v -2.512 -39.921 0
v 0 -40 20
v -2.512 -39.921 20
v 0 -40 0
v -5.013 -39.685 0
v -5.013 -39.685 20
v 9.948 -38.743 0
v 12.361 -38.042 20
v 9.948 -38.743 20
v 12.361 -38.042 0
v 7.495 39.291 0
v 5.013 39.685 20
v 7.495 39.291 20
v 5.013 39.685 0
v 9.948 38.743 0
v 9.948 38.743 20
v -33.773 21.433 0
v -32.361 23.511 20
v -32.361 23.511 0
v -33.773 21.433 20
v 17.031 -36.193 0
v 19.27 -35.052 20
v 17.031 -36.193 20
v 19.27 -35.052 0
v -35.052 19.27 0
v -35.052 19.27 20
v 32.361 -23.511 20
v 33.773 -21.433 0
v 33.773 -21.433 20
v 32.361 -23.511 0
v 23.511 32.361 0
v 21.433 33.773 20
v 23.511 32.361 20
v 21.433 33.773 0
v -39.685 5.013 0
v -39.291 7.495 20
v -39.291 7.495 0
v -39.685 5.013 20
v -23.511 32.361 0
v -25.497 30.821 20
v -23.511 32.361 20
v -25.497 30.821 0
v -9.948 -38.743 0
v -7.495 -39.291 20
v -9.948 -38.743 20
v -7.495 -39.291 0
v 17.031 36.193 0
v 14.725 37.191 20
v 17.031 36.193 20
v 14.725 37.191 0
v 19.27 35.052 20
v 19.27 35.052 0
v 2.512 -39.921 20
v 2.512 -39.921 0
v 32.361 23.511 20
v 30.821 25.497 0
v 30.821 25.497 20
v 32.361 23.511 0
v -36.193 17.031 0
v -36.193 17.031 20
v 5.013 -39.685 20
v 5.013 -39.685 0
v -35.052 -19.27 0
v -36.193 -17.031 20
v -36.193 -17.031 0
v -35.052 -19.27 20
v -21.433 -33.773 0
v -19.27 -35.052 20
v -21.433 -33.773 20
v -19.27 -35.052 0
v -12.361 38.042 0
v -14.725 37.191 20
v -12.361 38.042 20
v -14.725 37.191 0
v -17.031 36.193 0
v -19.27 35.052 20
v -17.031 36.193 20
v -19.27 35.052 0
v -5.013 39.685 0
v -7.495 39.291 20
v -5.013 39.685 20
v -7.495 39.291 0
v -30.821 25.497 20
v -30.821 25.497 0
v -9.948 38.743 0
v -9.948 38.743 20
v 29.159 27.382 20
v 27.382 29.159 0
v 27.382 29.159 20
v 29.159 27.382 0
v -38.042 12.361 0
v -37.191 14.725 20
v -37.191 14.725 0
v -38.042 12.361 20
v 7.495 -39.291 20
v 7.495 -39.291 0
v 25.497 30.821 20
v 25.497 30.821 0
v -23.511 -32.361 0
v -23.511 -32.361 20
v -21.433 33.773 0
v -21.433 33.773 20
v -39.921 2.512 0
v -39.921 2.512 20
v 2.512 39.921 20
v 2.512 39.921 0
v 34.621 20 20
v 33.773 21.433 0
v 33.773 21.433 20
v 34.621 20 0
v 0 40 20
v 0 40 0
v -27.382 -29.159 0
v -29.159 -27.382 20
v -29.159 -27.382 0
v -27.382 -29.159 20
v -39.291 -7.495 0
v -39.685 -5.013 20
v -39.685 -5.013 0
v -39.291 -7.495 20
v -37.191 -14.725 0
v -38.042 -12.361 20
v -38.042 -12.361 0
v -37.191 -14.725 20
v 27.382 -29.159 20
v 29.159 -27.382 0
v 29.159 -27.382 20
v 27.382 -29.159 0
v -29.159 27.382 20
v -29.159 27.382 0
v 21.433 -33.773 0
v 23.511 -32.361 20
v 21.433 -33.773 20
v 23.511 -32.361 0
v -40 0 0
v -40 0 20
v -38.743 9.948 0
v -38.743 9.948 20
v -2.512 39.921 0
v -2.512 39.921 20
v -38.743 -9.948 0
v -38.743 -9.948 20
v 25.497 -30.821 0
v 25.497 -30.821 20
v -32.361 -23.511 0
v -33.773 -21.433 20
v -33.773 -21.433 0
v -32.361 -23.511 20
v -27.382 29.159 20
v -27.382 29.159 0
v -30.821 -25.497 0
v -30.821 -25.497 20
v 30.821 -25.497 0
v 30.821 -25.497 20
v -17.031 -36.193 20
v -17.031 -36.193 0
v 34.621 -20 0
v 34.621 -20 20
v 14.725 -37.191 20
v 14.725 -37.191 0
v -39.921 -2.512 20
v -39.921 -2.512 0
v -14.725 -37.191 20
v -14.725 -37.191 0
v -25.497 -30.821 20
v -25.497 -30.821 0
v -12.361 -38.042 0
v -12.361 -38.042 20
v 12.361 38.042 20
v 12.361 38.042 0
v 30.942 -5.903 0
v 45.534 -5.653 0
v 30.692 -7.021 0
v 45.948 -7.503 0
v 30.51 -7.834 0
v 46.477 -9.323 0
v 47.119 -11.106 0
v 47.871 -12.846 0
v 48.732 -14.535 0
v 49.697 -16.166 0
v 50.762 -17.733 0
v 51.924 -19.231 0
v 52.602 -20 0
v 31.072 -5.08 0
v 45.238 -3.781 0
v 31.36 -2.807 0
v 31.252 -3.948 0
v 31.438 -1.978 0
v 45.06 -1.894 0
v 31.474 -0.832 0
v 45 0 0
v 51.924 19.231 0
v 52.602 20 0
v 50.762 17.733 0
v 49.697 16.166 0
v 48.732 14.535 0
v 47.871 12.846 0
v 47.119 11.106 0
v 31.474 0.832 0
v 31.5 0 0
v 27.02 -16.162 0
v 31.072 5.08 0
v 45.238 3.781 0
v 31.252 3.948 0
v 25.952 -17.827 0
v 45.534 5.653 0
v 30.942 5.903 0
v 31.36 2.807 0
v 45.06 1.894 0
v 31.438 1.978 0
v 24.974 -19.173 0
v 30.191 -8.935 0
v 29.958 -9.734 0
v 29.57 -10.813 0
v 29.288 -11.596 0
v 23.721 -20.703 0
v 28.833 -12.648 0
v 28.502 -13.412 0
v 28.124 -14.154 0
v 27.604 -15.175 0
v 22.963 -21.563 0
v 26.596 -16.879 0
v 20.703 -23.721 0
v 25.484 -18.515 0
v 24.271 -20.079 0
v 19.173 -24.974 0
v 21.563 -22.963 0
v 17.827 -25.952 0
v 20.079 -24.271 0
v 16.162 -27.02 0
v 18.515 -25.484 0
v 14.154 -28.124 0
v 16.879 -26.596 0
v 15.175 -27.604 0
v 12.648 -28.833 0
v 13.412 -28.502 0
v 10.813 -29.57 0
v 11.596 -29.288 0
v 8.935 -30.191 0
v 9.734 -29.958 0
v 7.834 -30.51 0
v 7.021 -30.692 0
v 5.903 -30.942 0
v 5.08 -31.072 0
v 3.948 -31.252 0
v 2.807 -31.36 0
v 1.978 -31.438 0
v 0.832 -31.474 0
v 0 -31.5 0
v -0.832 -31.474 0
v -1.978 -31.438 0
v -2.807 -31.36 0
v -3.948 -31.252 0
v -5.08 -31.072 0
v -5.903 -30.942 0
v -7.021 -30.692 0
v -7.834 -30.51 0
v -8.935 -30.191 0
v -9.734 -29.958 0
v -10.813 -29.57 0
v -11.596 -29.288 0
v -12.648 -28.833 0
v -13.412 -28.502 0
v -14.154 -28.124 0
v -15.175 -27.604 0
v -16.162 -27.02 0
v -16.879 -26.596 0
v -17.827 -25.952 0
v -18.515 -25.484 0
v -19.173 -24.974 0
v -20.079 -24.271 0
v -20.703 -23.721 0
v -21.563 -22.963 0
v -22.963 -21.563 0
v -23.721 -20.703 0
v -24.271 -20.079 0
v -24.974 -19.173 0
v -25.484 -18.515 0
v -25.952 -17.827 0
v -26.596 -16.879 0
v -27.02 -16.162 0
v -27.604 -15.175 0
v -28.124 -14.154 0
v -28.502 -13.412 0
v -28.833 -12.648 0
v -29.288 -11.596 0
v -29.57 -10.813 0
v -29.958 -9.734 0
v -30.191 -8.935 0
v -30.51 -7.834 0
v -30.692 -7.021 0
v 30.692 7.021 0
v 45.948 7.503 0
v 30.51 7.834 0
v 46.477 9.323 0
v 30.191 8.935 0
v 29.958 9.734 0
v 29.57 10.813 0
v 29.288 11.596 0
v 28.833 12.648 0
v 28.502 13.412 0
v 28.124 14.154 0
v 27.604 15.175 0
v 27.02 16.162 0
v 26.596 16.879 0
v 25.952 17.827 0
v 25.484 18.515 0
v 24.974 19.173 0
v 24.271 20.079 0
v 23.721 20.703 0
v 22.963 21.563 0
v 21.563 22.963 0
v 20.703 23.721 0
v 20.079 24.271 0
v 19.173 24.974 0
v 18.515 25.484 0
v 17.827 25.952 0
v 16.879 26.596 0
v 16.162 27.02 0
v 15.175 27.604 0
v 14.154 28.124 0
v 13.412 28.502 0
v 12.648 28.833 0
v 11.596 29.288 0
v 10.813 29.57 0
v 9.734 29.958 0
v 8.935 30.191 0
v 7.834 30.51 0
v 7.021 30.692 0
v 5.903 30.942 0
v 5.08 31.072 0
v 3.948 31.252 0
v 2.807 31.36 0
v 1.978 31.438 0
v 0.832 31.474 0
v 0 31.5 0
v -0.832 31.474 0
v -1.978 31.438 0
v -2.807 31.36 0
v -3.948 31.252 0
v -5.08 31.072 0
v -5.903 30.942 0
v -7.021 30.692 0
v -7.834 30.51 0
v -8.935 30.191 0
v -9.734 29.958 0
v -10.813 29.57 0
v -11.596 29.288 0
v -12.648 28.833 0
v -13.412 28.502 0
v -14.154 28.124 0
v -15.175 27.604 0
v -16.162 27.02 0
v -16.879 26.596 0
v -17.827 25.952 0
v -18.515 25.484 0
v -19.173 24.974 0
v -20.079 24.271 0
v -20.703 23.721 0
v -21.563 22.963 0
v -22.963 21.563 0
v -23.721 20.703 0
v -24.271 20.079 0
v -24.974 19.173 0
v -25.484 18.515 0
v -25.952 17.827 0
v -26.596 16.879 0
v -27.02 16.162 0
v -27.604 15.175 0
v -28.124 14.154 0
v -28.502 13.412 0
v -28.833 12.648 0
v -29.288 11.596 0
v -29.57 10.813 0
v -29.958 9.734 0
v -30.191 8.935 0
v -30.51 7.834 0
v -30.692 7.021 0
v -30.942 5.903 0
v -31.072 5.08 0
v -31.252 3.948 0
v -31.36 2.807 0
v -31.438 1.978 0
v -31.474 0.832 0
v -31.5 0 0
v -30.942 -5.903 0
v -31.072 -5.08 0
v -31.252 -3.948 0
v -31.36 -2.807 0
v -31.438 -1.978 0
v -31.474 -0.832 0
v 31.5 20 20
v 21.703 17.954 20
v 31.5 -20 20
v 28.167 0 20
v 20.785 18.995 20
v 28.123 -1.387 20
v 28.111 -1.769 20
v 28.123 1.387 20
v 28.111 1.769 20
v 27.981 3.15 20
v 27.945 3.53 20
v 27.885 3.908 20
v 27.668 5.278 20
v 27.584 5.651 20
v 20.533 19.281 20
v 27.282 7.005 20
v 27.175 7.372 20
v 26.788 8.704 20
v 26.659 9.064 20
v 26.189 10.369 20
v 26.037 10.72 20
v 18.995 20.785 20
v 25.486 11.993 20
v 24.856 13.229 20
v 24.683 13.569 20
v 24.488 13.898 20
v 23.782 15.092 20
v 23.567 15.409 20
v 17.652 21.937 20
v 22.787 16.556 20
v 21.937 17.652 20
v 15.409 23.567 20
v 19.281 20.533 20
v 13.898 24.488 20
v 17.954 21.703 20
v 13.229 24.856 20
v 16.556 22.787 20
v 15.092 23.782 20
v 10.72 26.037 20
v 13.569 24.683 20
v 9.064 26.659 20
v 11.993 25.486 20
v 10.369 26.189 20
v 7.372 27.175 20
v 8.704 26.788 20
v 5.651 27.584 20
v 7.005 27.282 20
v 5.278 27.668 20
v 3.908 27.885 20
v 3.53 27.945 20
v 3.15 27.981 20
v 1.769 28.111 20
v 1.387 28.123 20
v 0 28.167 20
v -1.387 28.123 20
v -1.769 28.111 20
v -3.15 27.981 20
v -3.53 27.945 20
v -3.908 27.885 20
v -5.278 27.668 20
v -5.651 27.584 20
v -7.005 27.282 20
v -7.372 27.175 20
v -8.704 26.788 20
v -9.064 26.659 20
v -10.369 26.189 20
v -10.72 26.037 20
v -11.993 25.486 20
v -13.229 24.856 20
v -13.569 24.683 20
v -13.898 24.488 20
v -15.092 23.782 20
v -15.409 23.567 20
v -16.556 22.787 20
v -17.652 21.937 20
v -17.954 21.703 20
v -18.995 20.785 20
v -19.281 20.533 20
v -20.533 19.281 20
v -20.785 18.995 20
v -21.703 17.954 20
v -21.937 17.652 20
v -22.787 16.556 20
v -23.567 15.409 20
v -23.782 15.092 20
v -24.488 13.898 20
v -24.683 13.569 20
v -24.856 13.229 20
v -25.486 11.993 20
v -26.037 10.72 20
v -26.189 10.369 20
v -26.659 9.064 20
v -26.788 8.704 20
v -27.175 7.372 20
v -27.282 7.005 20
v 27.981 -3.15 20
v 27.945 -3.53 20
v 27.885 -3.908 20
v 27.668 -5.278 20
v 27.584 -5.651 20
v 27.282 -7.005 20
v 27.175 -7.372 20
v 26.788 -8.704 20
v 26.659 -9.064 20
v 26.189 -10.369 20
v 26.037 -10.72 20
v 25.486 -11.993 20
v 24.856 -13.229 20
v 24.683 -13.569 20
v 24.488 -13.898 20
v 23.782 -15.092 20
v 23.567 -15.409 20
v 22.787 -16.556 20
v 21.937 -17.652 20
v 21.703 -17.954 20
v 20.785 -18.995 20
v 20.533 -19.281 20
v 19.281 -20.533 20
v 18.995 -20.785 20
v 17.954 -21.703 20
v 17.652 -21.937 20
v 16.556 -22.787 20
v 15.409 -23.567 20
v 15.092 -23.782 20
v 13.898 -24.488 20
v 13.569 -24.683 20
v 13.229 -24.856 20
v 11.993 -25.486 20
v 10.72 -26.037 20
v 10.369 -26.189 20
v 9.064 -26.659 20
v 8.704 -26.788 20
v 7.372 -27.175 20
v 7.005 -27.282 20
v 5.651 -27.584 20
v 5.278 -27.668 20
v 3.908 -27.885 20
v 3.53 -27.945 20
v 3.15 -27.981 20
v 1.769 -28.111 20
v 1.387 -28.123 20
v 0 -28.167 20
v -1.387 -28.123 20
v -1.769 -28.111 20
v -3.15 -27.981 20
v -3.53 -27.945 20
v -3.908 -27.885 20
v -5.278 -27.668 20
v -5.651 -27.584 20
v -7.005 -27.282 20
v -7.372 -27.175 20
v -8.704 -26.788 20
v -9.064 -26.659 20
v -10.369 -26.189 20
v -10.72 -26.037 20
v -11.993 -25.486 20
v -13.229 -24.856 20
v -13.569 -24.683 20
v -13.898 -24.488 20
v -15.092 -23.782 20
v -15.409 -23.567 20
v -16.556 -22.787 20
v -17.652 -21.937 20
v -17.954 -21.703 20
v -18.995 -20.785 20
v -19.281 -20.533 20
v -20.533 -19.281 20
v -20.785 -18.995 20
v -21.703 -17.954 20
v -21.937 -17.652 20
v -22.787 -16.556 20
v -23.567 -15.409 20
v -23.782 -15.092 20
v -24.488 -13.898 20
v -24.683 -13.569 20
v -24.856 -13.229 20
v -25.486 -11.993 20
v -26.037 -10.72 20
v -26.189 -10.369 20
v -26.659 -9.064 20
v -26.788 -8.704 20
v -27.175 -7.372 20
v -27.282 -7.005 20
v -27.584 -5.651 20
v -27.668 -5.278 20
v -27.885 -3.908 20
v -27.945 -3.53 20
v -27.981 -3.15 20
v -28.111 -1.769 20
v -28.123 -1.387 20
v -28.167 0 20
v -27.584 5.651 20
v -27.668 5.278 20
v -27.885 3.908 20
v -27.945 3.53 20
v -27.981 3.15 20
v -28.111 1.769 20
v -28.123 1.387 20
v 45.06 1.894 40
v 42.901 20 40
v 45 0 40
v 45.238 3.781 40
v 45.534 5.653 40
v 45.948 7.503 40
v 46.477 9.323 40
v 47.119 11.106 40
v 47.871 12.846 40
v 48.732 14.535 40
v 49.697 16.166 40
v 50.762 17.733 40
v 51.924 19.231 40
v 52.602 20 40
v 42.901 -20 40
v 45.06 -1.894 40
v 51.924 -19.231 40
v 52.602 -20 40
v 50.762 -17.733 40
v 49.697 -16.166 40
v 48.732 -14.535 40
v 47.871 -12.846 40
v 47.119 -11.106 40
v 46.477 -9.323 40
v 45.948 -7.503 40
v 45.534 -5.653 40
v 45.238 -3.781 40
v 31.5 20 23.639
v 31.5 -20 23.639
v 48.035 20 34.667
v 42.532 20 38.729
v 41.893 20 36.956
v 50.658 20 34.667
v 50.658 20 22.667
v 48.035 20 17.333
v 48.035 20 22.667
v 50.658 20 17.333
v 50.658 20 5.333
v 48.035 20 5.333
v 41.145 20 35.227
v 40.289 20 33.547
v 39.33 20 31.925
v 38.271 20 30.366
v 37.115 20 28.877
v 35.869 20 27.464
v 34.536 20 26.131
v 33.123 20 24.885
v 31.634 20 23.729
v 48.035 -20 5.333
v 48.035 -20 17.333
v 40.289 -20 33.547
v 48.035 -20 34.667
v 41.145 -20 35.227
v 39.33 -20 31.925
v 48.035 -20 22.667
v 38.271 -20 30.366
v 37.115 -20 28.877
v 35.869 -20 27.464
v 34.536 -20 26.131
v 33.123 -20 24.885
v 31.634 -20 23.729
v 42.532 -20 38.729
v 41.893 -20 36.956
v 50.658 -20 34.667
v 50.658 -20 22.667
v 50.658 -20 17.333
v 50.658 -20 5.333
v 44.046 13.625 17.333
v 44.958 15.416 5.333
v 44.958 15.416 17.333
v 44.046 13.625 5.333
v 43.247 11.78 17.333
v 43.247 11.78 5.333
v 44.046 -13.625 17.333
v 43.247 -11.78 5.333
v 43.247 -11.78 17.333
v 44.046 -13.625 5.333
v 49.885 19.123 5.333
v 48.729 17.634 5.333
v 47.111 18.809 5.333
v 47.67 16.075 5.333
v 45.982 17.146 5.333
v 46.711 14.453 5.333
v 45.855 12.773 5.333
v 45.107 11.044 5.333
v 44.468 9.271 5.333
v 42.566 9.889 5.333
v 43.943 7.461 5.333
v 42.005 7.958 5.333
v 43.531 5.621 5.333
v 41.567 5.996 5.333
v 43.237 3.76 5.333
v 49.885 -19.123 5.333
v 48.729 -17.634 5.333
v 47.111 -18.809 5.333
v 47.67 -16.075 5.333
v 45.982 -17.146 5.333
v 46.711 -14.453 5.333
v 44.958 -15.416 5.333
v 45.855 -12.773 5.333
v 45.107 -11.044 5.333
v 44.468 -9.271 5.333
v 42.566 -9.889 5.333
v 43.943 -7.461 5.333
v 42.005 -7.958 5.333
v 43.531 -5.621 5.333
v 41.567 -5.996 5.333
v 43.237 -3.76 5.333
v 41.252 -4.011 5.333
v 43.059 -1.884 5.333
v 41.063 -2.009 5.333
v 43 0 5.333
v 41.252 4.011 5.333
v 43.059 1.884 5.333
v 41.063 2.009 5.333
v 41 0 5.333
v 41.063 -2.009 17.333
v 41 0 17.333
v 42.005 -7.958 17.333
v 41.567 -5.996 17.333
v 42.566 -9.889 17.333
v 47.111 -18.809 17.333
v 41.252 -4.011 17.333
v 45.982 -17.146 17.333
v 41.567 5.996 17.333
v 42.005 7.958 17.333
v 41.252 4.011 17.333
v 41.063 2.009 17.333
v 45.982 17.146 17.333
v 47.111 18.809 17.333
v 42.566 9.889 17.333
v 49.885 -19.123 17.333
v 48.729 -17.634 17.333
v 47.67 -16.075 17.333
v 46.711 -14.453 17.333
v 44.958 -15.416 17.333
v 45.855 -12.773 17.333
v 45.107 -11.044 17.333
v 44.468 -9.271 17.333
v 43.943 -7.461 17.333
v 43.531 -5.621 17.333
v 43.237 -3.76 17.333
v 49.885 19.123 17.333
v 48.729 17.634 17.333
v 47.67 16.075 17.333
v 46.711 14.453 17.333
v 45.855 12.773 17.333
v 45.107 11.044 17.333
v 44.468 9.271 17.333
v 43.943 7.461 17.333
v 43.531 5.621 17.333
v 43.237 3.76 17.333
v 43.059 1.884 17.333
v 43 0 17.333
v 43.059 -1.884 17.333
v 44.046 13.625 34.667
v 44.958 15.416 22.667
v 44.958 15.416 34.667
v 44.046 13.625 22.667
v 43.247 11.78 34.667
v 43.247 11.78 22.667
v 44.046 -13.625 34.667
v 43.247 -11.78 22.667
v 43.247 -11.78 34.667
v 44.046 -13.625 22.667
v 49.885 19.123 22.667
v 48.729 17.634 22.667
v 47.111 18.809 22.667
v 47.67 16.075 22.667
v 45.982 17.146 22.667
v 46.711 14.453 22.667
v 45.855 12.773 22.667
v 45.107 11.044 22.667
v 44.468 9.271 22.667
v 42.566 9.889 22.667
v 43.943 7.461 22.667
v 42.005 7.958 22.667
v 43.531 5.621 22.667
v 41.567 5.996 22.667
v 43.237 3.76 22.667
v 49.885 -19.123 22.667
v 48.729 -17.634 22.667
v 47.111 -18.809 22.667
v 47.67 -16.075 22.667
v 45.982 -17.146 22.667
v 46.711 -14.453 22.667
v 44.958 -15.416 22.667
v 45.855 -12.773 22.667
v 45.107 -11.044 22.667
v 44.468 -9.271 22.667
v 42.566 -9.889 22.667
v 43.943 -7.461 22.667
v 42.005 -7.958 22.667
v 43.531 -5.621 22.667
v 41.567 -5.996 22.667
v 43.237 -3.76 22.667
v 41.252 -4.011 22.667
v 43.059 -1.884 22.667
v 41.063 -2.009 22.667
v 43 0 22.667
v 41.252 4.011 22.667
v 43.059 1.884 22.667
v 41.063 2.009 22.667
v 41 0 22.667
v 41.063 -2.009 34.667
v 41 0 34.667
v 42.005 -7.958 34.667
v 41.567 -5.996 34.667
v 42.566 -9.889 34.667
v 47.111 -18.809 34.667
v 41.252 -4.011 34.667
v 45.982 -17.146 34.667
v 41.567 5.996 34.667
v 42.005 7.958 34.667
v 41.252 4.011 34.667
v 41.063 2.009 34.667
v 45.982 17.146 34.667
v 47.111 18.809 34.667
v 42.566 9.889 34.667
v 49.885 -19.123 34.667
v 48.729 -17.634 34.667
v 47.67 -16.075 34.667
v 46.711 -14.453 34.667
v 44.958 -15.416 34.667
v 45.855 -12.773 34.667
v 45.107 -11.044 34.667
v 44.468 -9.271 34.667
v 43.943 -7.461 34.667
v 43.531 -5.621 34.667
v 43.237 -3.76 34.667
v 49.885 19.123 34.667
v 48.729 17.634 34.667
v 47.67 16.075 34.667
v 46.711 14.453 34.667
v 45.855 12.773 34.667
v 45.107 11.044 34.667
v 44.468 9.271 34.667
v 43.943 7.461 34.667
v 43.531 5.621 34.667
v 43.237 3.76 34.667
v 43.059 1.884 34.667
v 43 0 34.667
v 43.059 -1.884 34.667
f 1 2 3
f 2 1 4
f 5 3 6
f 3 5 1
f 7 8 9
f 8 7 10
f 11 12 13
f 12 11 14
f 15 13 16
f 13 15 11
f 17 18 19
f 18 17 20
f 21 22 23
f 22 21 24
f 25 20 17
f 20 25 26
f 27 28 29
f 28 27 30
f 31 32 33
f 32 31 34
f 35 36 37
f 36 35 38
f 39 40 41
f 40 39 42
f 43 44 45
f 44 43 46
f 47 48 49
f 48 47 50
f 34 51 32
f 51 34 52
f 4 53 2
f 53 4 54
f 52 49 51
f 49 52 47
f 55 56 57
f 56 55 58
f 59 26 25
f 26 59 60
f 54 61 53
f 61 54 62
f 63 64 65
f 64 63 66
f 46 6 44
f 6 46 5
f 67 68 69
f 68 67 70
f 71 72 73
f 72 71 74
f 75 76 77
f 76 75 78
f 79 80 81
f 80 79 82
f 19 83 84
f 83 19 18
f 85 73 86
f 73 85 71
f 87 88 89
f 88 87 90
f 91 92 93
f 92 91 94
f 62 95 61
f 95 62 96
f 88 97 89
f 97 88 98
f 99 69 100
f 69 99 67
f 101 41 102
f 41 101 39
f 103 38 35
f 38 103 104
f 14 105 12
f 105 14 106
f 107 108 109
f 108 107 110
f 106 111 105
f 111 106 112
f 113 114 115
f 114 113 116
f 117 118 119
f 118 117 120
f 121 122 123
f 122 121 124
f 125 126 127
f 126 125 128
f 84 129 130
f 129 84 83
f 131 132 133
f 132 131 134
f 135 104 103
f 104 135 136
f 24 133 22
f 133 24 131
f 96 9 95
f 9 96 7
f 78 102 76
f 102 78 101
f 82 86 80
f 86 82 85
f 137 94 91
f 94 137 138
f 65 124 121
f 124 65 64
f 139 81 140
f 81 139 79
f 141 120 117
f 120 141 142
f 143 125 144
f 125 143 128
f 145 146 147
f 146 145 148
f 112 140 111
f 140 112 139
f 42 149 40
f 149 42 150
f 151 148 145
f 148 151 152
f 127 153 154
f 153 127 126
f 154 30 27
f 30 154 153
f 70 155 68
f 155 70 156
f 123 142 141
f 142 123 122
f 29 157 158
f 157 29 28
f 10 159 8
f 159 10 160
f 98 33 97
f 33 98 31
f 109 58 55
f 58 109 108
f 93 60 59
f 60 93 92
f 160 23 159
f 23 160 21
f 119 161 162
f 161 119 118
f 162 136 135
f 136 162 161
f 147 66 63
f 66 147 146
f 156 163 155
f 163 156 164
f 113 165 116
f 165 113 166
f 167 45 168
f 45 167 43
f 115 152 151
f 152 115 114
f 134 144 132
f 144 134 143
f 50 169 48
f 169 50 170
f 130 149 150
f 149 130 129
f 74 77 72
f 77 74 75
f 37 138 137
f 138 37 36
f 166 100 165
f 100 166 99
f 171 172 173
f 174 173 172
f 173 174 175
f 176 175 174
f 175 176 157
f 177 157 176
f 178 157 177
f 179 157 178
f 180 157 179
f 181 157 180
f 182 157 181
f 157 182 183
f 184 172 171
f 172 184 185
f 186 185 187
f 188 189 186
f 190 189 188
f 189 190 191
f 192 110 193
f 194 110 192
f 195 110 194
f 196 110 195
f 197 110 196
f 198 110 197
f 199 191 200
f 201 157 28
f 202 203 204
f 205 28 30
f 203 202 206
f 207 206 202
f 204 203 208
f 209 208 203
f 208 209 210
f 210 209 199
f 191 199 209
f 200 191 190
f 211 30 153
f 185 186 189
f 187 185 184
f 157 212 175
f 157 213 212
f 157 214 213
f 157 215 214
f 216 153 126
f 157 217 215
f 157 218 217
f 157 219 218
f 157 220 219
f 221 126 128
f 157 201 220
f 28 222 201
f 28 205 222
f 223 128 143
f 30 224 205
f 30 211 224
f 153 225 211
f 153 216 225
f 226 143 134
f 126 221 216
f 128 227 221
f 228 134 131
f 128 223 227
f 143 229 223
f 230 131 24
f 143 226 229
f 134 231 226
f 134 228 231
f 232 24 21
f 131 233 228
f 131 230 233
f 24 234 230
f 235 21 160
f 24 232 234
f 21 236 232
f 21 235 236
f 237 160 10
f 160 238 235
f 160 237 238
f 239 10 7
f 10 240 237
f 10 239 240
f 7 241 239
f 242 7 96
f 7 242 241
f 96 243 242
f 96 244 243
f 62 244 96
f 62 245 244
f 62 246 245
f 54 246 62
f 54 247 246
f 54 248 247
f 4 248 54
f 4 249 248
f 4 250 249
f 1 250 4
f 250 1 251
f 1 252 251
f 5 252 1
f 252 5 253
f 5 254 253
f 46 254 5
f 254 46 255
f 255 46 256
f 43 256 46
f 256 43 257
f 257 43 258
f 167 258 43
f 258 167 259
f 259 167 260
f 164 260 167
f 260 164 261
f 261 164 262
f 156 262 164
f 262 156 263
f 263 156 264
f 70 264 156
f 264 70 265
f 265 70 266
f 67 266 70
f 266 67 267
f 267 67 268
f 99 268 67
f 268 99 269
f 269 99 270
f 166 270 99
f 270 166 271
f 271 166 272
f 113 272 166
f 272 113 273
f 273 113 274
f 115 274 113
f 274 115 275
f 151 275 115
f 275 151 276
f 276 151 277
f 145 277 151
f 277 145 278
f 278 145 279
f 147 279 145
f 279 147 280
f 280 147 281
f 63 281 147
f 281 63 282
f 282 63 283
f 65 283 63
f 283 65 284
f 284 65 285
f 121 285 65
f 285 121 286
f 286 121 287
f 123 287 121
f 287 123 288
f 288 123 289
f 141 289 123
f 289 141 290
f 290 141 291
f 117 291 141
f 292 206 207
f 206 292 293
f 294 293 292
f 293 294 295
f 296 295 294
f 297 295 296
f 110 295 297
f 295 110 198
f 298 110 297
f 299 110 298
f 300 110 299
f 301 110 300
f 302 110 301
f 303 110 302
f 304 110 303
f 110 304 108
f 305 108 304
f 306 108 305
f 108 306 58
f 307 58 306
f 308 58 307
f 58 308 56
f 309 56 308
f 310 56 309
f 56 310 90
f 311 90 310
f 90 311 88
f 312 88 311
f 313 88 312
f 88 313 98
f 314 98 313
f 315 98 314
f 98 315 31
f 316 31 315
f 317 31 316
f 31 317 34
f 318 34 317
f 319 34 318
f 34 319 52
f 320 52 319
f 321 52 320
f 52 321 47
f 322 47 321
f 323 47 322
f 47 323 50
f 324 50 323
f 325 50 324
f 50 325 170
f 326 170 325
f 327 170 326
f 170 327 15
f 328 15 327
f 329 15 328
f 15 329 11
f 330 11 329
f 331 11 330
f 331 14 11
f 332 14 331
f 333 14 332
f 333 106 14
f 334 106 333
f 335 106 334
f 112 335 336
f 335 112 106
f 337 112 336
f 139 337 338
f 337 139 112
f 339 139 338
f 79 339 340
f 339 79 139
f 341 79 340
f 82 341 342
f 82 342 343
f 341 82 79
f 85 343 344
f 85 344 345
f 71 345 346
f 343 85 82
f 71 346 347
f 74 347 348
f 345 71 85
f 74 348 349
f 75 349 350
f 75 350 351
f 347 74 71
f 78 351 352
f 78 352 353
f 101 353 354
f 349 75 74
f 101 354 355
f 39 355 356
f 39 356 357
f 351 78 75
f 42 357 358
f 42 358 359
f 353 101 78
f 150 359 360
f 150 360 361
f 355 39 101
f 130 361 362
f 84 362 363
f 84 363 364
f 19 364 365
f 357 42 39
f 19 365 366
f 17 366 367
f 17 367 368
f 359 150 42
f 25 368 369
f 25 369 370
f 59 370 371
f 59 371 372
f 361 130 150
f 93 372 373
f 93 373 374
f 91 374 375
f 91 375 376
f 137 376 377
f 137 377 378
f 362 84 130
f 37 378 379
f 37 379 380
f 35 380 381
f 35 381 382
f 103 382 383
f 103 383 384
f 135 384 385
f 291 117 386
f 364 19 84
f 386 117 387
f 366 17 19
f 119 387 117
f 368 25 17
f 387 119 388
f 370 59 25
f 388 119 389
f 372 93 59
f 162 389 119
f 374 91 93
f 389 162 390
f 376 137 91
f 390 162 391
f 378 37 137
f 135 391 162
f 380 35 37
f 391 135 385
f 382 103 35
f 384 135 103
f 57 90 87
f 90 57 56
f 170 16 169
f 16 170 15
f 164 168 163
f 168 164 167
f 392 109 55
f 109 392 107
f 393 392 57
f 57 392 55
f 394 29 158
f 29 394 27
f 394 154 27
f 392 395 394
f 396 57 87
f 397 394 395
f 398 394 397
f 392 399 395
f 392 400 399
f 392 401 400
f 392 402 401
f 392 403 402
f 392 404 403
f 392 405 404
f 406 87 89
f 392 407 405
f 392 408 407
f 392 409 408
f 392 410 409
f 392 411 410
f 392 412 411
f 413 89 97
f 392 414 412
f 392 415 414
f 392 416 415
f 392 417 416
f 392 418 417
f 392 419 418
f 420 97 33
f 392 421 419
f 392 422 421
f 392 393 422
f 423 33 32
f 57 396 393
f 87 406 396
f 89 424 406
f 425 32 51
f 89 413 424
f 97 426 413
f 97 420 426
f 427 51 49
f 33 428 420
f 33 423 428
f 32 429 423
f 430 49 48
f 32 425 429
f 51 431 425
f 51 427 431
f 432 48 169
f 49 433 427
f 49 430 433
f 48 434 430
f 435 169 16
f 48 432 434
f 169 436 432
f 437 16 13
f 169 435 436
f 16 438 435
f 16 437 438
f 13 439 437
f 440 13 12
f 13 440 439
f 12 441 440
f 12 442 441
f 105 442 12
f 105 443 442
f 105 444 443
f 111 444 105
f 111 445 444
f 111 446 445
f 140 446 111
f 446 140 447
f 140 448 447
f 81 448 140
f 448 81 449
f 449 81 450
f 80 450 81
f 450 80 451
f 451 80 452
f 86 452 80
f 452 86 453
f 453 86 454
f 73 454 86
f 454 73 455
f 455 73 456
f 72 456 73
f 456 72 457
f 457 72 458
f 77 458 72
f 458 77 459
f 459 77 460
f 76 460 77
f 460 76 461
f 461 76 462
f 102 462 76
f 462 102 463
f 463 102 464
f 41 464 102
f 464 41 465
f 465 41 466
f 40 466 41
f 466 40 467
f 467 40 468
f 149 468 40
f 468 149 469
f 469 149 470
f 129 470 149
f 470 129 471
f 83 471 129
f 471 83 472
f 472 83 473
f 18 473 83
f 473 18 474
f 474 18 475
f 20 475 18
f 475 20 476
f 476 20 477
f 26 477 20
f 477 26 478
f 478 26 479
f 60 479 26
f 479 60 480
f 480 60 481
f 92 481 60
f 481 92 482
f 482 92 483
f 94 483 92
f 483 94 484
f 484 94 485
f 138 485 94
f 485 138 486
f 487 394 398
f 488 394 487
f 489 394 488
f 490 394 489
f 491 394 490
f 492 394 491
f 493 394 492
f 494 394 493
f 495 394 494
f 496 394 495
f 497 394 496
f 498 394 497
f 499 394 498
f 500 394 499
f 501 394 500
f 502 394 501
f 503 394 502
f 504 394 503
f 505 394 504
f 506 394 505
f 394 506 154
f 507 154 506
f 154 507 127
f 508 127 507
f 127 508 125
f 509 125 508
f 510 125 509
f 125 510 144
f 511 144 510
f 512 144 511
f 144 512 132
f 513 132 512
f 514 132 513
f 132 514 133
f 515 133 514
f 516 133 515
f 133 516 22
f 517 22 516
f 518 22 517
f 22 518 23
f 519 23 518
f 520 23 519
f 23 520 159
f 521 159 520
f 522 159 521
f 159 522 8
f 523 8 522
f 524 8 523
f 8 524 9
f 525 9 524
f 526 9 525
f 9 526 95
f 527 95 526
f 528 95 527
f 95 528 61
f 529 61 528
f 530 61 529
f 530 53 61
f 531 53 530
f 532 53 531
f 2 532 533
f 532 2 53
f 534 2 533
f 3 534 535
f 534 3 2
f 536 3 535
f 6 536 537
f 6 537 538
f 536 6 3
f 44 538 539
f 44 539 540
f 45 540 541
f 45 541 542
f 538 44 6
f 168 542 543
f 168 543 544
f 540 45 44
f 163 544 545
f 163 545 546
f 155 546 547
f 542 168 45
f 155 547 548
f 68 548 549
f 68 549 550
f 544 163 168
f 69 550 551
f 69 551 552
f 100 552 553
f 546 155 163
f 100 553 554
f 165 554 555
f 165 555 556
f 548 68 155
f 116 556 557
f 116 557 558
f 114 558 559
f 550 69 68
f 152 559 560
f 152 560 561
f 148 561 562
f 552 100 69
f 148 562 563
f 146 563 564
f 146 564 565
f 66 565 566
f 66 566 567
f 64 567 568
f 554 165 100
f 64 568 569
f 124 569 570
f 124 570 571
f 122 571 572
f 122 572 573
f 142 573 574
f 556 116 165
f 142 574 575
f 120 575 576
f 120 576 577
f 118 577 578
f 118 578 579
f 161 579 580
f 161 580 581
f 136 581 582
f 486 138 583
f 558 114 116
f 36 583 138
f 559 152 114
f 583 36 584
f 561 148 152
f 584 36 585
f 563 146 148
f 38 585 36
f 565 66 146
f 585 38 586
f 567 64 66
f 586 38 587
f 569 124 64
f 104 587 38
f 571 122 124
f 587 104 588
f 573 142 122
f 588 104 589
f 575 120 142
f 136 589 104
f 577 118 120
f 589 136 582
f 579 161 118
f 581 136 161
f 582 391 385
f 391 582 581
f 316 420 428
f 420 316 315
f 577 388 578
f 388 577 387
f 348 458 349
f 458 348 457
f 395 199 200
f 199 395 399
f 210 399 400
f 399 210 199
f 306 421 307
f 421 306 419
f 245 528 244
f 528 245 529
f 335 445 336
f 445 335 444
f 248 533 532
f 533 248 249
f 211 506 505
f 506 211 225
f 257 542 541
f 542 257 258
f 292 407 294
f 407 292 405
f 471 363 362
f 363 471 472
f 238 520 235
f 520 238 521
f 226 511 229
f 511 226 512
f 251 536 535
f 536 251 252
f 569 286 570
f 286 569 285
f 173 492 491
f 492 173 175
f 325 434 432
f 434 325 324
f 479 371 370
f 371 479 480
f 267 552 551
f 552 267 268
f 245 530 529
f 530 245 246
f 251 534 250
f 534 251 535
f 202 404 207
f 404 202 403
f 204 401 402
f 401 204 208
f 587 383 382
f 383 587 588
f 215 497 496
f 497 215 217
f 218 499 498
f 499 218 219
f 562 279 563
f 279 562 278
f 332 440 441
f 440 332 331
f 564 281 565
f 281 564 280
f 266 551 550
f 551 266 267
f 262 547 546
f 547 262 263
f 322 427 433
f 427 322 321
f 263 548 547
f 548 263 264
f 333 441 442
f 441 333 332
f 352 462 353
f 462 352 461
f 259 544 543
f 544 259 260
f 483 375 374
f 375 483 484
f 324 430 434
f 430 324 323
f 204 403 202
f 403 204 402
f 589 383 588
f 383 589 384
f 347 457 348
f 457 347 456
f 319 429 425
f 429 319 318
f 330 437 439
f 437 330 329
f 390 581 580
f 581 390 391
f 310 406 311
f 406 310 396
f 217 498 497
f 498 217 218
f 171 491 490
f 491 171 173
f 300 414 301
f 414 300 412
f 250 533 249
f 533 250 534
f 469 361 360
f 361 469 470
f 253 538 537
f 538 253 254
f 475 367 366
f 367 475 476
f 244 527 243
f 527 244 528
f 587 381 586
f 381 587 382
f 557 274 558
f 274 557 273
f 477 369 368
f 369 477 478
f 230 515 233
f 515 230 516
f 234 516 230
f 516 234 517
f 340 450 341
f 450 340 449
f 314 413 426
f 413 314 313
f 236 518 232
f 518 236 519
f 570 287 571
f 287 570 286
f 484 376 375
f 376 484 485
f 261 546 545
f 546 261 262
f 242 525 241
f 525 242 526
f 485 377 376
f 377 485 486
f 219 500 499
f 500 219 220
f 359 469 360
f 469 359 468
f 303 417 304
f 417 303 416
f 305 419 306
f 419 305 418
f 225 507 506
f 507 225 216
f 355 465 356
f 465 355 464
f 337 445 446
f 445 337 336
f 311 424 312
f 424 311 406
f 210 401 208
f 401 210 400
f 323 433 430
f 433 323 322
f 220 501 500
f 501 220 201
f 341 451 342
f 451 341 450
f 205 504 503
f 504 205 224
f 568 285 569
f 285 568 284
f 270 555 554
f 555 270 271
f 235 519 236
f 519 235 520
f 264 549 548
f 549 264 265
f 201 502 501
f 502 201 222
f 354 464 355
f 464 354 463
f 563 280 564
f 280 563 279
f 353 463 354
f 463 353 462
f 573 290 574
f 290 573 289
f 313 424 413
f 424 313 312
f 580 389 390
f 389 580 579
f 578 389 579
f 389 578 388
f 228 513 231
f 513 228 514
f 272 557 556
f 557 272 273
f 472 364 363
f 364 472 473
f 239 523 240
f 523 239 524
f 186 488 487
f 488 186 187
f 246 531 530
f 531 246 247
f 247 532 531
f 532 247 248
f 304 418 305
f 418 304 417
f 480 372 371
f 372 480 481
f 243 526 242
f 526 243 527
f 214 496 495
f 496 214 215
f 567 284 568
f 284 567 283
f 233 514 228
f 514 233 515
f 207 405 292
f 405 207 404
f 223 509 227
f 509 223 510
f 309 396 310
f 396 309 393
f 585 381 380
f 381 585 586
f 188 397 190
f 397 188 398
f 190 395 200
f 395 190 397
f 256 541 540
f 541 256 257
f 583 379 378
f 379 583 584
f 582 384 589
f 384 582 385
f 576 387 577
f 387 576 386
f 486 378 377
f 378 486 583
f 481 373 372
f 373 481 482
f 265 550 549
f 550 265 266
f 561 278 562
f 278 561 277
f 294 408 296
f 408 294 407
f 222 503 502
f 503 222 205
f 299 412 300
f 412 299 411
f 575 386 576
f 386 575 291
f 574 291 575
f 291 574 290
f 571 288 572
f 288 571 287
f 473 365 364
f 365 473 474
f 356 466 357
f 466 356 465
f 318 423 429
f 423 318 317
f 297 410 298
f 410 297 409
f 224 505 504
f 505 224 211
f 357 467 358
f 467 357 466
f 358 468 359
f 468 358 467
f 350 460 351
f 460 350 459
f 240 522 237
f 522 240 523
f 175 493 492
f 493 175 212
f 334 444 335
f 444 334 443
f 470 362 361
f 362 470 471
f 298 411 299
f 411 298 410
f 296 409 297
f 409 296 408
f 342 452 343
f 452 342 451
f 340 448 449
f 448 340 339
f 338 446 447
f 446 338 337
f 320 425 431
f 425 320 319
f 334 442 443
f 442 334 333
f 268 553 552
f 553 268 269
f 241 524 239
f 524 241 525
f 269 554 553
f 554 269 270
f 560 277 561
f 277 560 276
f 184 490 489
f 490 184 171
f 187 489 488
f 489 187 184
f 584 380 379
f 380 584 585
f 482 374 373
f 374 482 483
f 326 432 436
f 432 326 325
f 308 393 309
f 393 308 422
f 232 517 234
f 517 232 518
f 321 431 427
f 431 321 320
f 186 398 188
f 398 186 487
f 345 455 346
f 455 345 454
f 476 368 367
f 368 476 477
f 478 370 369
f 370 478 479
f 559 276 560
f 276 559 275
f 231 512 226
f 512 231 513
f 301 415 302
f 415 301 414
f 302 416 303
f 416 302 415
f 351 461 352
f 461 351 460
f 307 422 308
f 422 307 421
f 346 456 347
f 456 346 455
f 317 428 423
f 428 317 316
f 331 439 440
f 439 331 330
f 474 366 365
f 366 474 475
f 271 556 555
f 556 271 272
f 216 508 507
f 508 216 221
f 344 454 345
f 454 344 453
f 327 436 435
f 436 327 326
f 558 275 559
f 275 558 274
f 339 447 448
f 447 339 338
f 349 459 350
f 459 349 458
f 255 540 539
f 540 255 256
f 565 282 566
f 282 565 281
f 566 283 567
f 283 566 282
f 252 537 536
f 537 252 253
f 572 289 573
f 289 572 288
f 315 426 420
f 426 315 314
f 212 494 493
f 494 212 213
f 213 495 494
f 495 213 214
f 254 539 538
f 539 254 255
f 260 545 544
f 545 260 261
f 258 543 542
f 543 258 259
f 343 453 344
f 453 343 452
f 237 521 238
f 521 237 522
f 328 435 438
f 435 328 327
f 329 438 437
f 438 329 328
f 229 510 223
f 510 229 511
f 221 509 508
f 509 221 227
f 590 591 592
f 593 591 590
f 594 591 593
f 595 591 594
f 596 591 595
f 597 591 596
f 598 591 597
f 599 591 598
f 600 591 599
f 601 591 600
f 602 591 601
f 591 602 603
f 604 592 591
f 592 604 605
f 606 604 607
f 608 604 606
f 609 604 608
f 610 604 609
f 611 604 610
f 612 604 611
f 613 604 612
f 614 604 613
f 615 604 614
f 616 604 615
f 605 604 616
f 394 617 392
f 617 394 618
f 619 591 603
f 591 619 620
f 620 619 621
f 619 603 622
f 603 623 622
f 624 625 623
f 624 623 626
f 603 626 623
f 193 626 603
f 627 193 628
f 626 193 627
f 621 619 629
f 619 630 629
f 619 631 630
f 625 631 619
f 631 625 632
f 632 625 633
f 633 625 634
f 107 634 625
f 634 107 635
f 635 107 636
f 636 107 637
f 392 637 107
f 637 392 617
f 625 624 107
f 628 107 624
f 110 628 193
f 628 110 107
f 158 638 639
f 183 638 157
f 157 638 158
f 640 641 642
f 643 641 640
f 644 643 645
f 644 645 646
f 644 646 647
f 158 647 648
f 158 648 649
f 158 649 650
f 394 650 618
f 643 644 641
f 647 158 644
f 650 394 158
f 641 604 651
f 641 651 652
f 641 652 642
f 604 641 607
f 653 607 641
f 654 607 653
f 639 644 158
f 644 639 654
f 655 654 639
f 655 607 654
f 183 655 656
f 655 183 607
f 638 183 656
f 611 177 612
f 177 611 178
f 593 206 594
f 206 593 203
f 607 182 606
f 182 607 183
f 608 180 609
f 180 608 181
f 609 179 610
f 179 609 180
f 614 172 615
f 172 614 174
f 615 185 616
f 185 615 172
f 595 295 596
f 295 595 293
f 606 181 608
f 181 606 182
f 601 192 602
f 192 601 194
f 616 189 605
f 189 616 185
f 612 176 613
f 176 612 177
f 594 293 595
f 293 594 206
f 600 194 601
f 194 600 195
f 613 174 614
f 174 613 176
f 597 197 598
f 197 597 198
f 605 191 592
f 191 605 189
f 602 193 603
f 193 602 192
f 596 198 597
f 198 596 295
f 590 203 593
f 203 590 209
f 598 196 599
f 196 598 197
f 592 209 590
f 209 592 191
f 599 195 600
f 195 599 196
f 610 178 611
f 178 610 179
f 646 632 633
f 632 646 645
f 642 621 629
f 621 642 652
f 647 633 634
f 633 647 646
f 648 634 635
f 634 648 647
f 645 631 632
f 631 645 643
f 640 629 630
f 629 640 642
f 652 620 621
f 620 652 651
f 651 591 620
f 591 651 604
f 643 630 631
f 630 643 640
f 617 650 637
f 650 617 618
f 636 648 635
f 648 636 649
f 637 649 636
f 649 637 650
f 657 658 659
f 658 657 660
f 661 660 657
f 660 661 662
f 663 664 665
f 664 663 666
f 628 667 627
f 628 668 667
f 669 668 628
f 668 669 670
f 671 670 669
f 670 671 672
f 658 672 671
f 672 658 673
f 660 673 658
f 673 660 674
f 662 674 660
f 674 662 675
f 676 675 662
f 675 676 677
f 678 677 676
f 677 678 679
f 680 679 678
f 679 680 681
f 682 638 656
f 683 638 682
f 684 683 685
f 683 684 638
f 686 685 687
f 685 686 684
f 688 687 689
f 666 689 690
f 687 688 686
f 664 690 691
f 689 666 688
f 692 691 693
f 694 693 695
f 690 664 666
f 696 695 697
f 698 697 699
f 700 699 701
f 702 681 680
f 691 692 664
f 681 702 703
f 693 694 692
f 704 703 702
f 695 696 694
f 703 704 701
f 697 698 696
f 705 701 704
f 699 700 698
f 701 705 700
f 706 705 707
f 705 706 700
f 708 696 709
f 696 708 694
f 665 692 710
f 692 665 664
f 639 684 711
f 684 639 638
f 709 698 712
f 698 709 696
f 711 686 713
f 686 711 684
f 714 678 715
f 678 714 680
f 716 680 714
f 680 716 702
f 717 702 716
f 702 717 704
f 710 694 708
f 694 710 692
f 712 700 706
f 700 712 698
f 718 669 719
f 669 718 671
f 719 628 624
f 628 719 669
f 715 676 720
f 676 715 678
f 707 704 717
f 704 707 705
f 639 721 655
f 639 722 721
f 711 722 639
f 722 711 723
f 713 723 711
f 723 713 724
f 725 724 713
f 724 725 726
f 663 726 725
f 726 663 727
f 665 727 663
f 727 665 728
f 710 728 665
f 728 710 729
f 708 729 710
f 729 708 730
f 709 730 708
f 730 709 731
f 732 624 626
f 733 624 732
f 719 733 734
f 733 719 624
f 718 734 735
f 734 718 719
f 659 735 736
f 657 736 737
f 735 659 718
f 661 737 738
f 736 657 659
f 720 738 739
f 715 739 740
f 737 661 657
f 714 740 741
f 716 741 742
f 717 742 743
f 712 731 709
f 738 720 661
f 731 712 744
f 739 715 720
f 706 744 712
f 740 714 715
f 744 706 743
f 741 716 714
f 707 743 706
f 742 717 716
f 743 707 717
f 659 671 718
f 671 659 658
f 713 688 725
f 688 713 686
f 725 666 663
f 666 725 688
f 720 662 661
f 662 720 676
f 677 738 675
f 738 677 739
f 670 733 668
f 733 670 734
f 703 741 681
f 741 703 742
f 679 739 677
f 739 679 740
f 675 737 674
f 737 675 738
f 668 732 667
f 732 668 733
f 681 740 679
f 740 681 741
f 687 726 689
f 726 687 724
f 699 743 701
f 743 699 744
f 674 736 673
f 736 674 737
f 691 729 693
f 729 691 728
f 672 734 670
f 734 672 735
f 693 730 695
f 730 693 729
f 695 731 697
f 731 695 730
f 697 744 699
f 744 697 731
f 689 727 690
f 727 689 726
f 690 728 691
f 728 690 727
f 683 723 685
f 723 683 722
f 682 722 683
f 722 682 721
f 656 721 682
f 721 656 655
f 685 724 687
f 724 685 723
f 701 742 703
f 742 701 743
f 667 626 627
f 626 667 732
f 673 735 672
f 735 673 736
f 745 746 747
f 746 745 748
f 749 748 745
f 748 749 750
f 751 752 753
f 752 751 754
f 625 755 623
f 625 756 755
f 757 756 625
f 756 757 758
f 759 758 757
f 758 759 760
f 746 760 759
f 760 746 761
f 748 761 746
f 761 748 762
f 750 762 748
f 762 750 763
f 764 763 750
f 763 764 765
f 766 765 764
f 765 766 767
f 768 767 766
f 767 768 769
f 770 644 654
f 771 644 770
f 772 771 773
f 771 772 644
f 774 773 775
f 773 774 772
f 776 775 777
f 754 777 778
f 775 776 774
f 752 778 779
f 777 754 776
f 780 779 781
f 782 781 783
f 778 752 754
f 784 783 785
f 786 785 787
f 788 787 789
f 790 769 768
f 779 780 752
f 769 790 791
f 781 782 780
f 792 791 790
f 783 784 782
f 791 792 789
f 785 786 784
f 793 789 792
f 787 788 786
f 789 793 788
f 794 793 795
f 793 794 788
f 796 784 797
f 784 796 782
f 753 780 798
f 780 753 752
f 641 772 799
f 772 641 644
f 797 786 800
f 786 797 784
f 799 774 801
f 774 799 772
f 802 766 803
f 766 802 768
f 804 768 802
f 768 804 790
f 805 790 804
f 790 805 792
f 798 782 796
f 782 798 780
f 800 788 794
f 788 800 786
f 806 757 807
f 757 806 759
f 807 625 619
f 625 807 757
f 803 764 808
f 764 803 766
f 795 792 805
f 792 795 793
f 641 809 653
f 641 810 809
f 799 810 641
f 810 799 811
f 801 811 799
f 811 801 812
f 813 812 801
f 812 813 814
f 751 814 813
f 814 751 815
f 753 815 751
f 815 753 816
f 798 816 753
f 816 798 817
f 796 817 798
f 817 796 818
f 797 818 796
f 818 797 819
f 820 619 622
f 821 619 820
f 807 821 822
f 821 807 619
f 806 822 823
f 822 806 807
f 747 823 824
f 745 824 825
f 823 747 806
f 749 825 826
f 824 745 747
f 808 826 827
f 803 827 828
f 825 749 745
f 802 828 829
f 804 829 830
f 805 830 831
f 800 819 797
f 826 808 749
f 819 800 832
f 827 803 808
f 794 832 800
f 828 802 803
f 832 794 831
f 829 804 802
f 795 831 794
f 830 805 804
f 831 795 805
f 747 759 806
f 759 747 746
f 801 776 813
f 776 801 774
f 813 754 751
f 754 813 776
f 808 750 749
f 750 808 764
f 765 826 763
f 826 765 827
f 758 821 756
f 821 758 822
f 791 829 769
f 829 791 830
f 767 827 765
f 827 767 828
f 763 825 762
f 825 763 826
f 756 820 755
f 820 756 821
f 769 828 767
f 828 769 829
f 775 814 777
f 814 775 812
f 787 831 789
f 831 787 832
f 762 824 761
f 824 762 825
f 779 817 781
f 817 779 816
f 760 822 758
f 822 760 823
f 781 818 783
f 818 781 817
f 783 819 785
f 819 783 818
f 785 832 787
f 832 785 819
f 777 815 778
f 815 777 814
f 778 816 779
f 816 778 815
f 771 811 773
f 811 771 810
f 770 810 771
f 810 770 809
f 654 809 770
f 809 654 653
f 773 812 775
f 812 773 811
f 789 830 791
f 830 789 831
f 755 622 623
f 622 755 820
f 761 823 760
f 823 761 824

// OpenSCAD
/* NOTES:
	writecylinder(text="text",where=[0,0,0],radius=20,height=40);
	
	Required Parameters (If supplied in this order, identifier is not required)
		text="text"	 	: Text to be written
		where=[x,y,z]	: coordinates of cylinder
		radius=mm 		: radius of cylinder
		height=mm 		: height of cylinder

	Optional Parameter:
		center=boolean :	use this to specify that cylinder is centered on coordinates
					(default is center=false)
		face="top" : Top of cylinder
		face="bottom": bottom of cylinder
		face="front" :barrel of cylinder (default if not supplied)	

	Optional Parameters: (face is not "top" or "bottom")
		east=degrees : west= degrees: (moves text east or west around z)
		up=mm or down=mm : moves text up or down along Z axis
		rotate=degrees : rotates text around Y axis (spirals around cylinder)
	
	Optional Parameters: (face="top" or face="bottom")
		east=degrees or west=degrees : rotate text east or west around top
		rotate=degrees : (similar to east west but not dependant on text orientation)
		ccw=boolean : If true, writes in a counter clockwise direction. (default=false)
		middle=mm :moves the text ?mm toward center of top or bottom surface 	

*/

use <WriteSVG.scad>


 //-- Parmetros del vaso
/* grosor = 20;
 diam_ext=80;
 diam_int = 63.3; 
 texto = "Claudia";
diam_tubo = 60;
*/

// Aro
module aro(grosor_aro=20,  diam_ext=80, diam_int = 63.3, texto = "Gonzalo")
{
 // Exterior Aro
 difference(){
  difference() {
     //-- Base de la rueda
    cylinder(r=diam_ext/2,h=grosor_aro,  $fn=100);
	rotate([0,180,-90])
	translate([0,0,-20])
    	writecylinder(texto,[0,0,0],diam_ext/2-0.7,grosor_aro);
   } 

    //-- Taladro aro
   cylinder(r1=diam_int/2+5, r2=diam_int/2-5,h=grosor_aro*3,$fn=100,center=true);
 }
}

//Base asa
module base_asa(altura=40, diam_int = 63.3, diam_ext=80, diam_tubo = 60)
{
difference(){
difference(){
 translate([diam_int/2,-20,0])
 cube([30,40,altura]);

translate([(diam_ext+diam_tubo)/2+5,0,altura/2])
  cylinder(r=diam_tubo/2, h=altura*2,$fn=100,center=true);
}

translate([14,21,48])
rotate([90,0,0])
cylinder(r=60/2,h=42,  $fn=100);
}
}

//Cuerpdel soporte del vaso
module cuerpo_sv(grosor_aro=20,  diam_ext=80, diam_int = 63, texto = "Claudia",altura=40, diam_tubo = 60.34){
 aro(grosor_aro,  diam_ext, diam_int, texto);
 base_asa(altura, diam_int, diam_ext, diam_tubo);
}

module agarradera( diam_ext=80, diam_int = 63.3, altura_ag=12, ancho_ag=2, diam_tubo = 60){
difference(){
  	translate([(diam_ext+diam_tubo)/2+3,0,0])
	cylinder(r=diam_tubo/2+ancho_ag, h=altura_ag,$fn=100);

  	translate([(diam_ext+diam_tubo)/2+3,0,-altura_ag*2])
	cylinder(r=diam_tubo/2, h=altura_ag*4,$fn=100);
}
}

module agarraderas( altura_asa=40, diam_ext=80, diam_int = 63.3, altura_ag=12, ancho_ag=2, diam_tubo = 60){
separacion=(altura_asa-altura_ag*2)/3;
translate([0,0,separacion])
agarradera(diam_ext, diam_int , altura_ag, ancho_ag, diam_tubo );

translate([0,0,separacion*2+altura_ag])
agarradera(diam_ext, diam_int , altura_ag, ancho_ag, diam_tubo );

}

module soporte_vaso(){
	difference(){	
		cuerpo_sv();
		agarraderas();
	}
}
/*difference(){	
soporte_vaso();
color("Red")
translate([14,21,48])
rotate([90,0,0])
cylinder(r=60/2,h=42,  $fn=100);
}*/

soporte_vaso();
